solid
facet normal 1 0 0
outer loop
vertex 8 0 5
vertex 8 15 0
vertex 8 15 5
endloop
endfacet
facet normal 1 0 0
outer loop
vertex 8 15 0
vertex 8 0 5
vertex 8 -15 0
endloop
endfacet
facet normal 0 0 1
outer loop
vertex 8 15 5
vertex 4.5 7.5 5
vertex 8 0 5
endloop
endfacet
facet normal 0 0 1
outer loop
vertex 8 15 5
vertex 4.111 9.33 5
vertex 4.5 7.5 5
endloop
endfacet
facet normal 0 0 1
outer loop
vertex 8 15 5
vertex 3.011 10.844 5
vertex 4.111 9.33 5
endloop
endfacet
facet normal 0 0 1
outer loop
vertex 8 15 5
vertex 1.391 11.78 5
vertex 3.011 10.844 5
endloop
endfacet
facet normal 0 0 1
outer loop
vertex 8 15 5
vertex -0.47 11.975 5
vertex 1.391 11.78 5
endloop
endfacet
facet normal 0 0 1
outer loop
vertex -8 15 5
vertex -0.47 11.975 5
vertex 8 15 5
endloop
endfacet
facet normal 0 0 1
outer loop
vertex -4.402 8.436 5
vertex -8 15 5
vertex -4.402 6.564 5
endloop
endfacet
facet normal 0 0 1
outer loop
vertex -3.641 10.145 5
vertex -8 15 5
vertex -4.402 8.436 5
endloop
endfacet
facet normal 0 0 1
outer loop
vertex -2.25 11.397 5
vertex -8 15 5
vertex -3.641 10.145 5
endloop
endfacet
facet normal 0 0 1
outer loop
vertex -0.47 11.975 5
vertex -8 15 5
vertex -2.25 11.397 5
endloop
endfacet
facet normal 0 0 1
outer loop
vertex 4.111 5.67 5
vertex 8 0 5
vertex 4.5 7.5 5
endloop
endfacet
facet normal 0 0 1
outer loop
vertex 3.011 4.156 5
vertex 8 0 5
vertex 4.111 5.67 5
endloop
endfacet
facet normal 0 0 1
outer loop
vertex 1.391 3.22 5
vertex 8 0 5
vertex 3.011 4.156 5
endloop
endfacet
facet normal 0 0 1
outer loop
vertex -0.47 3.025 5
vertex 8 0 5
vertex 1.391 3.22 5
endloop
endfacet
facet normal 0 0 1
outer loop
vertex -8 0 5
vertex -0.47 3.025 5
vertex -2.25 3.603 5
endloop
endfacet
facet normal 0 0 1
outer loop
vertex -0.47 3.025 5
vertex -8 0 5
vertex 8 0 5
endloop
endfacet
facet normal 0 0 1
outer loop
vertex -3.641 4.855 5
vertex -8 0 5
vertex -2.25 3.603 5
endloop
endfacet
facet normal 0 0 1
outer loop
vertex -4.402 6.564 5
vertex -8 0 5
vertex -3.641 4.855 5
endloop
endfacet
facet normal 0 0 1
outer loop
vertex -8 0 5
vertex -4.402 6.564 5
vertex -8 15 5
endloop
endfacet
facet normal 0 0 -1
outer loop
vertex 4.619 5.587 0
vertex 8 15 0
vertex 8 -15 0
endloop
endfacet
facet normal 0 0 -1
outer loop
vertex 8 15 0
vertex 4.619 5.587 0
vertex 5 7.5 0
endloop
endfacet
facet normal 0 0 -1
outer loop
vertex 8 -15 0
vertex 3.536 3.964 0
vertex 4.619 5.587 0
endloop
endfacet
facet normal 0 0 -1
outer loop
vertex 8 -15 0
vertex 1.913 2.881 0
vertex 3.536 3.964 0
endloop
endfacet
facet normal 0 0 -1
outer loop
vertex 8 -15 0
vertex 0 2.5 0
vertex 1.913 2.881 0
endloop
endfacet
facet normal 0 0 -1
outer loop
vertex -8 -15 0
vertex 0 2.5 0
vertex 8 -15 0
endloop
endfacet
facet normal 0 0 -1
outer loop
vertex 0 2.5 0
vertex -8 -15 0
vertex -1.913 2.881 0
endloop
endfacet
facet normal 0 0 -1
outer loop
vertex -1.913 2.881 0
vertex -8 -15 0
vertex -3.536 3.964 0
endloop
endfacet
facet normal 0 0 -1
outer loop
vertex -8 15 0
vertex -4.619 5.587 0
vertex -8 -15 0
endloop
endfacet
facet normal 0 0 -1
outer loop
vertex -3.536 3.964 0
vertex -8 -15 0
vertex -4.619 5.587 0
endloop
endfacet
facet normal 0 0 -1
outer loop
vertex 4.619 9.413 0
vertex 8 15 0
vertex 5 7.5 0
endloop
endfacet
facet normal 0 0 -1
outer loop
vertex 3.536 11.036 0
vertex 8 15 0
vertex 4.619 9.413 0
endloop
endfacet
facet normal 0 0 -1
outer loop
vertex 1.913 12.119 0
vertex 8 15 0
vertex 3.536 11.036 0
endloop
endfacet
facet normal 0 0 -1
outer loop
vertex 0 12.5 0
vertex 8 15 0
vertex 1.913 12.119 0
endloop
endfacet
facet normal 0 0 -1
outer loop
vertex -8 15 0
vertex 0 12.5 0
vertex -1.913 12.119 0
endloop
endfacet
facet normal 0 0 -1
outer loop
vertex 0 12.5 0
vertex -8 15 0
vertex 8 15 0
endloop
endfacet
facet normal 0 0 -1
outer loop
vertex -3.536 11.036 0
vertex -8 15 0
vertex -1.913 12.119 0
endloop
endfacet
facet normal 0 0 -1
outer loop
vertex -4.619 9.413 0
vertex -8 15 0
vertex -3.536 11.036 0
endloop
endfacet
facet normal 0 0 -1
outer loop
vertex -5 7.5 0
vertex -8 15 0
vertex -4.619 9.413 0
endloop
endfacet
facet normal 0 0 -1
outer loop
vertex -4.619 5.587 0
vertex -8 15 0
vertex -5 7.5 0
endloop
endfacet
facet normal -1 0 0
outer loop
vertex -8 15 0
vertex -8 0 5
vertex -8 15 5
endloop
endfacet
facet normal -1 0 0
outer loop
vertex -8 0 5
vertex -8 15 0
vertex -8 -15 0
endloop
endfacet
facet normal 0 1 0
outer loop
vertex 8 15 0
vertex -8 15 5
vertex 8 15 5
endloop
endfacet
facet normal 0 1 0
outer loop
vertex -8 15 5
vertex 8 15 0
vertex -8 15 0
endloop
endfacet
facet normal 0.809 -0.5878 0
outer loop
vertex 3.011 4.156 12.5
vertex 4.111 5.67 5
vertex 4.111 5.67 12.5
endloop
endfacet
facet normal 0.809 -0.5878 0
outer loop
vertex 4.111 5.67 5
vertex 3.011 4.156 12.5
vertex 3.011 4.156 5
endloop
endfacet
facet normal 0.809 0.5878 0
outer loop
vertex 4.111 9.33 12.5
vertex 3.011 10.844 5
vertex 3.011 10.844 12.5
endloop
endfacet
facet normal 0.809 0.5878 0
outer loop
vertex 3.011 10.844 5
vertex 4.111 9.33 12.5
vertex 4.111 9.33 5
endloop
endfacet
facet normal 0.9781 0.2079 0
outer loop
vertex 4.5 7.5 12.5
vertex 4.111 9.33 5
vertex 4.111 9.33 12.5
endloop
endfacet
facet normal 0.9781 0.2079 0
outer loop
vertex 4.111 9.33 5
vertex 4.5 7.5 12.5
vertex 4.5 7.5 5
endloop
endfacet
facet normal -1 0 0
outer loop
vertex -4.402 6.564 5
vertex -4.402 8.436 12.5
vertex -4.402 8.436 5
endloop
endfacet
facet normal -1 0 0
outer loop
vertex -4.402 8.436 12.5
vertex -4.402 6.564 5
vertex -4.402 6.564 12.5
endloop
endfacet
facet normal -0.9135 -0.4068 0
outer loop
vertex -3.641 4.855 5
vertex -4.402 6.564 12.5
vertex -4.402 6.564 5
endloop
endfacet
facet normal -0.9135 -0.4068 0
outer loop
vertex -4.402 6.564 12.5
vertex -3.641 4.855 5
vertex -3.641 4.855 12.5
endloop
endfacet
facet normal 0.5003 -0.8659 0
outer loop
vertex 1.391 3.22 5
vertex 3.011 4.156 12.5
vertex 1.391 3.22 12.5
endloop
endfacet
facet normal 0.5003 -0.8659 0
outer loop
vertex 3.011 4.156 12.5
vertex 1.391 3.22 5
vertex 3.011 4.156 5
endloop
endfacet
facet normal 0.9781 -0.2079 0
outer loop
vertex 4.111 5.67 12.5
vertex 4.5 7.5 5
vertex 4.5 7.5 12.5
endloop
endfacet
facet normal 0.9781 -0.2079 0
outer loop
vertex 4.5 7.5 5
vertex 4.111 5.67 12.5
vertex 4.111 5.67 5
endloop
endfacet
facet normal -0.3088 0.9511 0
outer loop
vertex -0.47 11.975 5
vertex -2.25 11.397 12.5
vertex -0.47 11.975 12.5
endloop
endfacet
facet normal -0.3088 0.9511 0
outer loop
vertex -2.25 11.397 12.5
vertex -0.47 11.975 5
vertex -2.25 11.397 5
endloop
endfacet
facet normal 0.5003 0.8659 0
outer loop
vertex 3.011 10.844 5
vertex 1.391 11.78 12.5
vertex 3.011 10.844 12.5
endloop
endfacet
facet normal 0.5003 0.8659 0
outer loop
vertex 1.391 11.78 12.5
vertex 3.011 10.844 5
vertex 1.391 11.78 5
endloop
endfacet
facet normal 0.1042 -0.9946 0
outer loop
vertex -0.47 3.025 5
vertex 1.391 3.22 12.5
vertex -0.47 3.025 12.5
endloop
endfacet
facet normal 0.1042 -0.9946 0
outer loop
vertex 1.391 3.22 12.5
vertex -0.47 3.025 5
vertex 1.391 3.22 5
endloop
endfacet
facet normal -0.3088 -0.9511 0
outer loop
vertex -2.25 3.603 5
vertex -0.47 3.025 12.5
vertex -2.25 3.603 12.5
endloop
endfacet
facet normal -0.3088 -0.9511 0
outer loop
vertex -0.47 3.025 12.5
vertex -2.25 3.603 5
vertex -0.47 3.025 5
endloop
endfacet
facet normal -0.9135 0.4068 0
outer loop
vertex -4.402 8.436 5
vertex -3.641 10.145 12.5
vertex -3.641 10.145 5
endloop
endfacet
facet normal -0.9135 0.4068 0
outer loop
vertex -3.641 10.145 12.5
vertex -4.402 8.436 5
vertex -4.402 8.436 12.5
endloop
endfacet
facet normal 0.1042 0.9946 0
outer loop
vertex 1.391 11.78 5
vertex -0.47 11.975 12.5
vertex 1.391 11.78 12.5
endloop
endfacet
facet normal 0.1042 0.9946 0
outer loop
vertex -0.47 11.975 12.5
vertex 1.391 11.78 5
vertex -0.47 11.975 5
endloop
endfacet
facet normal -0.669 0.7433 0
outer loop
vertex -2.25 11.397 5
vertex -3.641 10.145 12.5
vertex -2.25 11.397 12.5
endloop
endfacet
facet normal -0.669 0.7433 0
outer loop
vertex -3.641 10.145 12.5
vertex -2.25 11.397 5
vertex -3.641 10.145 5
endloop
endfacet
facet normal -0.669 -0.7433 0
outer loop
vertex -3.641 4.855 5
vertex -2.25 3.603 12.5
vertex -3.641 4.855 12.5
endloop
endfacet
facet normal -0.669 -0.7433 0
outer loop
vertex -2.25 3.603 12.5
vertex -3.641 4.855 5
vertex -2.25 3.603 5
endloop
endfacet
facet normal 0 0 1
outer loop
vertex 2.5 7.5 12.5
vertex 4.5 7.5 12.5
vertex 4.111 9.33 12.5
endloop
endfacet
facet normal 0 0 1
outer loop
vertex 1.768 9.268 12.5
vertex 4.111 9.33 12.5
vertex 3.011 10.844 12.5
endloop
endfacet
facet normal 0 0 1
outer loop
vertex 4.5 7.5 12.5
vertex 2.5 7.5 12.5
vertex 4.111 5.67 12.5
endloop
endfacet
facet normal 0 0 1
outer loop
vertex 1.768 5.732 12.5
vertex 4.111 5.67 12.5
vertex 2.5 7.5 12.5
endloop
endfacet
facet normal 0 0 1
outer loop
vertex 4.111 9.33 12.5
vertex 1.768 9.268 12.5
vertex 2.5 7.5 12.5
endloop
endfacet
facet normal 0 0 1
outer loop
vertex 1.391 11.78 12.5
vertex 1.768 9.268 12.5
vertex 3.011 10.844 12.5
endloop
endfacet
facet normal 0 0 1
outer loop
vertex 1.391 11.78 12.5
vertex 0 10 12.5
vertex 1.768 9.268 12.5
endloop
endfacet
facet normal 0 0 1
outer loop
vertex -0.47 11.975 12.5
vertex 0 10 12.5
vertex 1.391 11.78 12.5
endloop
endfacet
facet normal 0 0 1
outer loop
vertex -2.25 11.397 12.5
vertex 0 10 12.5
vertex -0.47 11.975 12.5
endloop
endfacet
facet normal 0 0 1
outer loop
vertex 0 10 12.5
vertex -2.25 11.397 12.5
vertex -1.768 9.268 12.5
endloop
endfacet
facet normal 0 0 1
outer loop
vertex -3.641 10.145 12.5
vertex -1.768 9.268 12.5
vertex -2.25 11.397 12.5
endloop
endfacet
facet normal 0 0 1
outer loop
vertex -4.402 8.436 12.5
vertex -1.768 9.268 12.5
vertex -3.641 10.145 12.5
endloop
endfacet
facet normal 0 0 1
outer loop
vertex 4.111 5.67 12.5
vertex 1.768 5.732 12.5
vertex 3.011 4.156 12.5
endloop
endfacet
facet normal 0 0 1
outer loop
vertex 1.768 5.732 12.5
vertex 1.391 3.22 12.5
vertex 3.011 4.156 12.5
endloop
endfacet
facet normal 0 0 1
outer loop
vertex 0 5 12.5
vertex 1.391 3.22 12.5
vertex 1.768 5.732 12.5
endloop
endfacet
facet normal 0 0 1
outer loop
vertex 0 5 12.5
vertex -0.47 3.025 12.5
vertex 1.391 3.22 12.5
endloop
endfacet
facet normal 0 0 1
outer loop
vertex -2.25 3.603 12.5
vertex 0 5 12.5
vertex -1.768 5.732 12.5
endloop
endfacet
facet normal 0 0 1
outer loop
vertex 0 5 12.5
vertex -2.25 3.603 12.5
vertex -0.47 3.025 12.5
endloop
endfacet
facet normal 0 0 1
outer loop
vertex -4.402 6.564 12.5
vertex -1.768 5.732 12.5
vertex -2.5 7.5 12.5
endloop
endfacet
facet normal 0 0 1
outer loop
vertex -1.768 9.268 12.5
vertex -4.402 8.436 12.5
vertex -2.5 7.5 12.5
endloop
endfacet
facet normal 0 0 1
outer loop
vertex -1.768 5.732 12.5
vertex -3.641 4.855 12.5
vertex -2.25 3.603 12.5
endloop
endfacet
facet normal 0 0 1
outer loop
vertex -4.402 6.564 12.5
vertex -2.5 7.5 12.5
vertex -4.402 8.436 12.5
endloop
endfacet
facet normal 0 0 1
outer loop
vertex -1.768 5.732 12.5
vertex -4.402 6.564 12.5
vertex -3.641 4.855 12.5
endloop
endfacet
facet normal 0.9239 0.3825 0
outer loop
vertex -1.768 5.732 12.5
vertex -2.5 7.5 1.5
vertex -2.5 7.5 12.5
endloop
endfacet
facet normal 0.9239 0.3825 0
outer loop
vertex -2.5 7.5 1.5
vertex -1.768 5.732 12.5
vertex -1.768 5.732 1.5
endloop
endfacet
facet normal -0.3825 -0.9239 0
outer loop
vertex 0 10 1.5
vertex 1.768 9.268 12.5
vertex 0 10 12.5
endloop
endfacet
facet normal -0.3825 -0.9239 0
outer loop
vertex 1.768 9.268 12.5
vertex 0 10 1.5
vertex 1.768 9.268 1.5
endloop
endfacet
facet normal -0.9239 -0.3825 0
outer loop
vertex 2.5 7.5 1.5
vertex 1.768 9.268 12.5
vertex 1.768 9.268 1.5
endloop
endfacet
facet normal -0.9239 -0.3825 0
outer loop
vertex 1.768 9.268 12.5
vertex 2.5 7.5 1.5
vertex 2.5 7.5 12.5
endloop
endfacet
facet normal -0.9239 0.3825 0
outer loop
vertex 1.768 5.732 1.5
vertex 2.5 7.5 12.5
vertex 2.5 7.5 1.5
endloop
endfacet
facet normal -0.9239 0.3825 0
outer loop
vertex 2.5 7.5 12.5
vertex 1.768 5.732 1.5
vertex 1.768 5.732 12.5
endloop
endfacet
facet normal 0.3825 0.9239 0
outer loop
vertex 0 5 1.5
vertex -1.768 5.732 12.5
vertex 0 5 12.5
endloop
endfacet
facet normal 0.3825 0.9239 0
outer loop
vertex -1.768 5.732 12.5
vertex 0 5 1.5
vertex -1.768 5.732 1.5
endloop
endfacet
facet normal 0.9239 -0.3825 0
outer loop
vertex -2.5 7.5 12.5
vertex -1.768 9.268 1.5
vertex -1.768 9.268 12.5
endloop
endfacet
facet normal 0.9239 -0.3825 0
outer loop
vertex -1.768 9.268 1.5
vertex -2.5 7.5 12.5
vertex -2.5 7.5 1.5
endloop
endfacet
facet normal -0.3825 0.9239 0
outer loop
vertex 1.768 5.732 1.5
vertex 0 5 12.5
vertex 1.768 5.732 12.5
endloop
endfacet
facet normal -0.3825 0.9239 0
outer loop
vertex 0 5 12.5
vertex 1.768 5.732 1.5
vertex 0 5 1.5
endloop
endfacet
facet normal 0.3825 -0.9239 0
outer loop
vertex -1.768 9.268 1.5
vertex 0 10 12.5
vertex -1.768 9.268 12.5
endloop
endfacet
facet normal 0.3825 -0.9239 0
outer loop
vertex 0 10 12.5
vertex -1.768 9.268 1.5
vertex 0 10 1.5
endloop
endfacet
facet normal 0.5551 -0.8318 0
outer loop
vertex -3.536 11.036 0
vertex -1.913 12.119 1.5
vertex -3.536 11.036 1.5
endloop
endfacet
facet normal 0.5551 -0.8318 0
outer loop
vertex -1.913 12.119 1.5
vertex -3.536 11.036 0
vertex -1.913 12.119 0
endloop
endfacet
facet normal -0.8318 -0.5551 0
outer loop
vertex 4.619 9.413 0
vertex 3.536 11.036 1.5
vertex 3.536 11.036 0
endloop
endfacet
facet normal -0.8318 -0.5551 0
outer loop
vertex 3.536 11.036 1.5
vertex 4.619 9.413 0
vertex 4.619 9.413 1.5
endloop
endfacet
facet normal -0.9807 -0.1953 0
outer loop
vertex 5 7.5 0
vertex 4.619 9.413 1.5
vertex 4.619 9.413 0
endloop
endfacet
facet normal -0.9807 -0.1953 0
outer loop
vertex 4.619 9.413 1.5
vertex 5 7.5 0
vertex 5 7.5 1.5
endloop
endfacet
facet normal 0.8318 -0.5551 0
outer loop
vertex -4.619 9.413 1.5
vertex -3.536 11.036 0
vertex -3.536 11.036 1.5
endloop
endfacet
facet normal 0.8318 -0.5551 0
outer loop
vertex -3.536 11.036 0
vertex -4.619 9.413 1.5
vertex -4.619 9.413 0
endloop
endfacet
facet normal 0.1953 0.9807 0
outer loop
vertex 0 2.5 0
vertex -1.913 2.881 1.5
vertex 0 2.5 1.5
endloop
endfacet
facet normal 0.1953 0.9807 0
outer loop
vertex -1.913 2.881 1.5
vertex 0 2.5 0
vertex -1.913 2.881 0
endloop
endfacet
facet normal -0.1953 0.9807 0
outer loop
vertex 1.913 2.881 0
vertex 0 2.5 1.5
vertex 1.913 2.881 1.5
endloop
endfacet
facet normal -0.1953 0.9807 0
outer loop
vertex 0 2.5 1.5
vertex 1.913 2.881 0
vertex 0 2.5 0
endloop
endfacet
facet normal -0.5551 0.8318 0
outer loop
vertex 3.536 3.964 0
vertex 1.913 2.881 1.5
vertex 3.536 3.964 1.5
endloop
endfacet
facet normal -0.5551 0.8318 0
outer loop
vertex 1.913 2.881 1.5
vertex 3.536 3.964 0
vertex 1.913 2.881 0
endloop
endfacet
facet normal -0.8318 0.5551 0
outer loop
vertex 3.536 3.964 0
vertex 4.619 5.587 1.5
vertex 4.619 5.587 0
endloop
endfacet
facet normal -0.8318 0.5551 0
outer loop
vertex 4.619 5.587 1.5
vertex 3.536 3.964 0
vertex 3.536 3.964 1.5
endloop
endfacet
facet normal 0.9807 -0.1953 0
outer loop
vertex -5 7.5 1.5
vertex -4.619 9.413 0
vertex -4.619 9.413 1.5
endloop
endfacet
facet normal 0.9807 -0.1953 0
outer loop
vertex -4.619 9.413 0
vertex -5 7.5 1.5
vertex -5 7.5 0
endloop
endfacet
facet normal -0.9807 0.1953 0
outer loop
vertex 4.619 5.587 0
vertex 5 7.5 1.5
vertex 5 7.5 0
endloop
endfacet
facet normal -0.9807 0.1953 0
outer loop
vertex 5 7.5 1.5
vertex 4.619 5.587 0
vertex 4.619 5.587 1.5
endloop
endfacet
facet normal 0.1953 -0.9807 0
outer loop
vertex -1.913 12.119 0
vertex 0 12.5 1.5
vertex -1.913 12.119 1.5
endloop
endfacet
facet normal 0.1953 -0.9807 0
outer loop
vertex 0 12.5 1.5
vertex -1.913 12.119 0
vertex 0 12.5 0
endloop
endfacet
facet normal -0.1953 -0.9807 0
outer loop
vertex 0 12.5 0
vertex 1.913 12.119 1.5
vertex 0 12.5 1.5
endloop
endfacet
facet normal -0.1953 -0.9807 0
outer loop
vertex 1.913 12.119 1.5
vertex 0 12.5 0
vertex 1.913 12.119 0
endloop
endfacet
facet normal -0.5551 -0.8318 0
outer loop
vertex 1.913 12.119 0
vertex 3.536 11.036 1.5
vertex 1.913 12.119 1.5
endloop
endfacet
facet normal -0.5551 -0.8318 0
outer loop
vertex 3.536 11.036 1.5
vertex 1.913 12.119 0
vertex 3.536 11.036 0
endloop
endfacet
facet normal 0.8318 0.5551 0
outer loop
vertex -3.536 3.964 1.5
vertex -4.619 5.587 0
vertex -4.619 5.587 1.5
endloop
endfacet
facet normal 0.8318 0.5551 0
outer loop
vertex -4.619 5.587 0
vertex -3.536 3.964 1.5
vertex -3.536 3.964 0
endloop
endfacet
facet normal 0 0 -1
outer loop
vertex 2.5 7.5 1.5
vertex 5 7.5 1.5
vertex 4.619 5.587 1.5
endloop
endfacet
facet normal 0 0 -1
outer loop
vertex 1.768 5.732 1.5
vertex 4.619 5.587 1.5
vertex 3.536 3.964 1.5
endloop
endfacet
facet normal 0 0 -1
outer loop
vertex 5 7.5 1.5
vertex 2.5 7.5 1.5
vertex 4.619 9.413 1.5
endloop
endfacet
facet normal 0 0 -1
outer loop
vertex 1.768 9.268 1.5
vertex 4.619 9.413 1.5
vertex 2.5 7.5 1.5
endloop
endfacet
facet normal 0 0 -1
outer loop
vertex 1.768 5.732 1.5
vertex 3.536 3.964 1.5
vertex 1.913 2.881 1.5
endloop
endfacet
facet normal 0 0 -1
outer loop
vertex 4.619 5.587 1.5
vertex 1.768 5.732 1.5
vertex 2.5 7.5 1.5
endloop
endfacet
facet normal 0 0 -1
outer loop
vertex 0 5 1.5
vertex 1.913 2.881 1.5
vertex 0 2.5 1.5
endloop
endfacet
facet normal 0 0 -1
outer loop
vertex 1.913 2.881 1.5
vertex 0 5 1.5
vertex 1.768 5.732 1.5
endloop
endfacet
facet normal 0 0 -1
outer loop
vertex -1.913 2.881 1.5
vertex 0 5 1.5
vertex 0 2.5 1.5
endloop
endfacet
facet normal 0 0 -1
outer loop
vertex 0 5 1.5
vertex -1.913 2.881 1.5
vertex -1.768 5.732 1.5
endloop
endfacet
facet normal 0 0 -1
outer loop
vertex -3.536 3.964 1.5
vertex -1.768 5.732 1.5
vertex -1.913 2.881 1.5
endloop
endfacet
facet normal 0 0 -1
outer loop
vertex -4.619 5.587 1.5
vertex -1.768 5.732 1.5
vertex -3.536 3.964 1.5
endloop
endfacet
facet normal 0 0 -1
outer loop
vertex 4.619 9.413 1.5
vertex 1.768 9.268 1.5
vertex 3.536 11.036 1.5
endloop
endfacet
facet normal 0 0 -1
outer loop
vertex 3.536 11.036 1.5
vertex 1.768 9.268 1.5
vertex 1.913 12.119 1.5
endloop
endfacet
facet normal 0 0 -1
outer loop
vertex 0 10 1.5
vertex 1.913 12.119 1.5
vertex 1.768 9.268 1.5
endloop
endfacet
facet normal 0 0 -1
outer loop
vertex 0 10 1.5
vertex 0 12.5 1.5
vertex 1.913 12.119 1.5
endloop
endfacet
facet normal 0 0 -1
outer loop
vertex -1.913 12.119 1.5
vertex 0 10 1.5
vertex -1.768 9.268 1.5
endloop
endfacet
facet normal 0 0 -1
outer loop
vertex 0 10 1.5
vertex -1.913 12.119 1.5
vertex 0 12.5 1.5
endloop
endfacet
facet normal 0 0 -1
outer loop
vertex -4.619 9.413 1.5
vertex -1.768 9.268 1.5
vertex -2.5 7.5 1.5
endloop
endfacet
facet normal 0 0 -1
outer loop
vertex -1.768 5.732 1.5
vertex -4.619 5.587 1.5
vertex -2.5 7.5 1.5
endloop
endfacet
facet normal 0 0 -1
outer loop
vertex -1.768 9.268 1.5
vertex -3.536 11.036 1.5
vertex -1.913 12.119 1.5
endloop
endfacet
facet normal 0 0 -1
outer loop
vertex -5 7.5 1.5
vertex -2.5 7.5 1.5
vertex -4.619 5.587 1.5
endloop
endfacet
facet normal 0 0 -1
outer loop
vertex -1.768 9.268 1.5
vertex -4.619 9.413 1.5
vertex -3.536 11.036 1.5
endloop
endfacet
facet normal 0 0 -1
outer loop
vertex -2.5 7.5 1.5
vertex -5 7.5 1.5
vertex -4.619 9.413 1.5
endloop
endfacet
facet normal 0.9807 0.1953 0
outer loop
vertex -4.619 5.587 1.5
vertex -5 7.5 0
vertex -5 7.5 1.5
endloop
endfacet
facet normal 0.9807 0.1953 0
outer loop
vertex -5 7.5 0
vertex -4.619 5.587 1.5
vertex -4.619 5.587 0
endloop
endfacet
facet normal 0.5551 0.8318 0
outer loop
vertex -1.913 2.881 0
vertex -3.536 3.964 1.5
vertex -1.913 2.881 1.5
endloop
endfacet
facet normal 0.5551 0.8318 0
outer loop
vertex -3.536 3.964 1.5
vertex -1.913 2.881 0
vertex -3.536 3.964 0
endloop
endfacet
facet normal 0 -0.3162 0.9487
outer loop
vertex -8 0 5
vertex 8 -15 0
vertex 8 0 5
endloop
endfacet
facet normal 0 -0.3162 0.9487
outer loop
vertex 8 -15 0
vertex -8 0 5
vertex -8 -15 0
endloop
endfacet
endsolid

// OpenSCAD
module prism(l, w, h){
    polyhedron(//pt 0        1        2        3        4        5
        points=[[0,0,0], [l,0,0], [l,w,0], [0,w,0], [0,w,h], [l,w,h]],
        faces=[[0,1,2,3],[5,4,3,2],[0,4,5,1],[0,3,4],[5,2,1]]
    );
}

h = 5;
w = 16;
l = 15;
slope = 10;
hole=5;
hole2=10;

pinH = 10;
pinWall = 2;

translate([-w/2, -h - slope, 0]) {
    prism(w, h+slope, h);
}

translate([0, l/2, h/2]) {
    difference() {
        union() {
            cube([w, l, h],true);
            cylinder(pinH, hole/2 + pinWall, hole/2 + pinWall);
        }
        translate([0, 0, -h/2-1]) {
            cylinder(pinH + 10, hole/2, hole/2);
            cylinder(h/2, hole2/2, hole2/2);
        }
    }
}
